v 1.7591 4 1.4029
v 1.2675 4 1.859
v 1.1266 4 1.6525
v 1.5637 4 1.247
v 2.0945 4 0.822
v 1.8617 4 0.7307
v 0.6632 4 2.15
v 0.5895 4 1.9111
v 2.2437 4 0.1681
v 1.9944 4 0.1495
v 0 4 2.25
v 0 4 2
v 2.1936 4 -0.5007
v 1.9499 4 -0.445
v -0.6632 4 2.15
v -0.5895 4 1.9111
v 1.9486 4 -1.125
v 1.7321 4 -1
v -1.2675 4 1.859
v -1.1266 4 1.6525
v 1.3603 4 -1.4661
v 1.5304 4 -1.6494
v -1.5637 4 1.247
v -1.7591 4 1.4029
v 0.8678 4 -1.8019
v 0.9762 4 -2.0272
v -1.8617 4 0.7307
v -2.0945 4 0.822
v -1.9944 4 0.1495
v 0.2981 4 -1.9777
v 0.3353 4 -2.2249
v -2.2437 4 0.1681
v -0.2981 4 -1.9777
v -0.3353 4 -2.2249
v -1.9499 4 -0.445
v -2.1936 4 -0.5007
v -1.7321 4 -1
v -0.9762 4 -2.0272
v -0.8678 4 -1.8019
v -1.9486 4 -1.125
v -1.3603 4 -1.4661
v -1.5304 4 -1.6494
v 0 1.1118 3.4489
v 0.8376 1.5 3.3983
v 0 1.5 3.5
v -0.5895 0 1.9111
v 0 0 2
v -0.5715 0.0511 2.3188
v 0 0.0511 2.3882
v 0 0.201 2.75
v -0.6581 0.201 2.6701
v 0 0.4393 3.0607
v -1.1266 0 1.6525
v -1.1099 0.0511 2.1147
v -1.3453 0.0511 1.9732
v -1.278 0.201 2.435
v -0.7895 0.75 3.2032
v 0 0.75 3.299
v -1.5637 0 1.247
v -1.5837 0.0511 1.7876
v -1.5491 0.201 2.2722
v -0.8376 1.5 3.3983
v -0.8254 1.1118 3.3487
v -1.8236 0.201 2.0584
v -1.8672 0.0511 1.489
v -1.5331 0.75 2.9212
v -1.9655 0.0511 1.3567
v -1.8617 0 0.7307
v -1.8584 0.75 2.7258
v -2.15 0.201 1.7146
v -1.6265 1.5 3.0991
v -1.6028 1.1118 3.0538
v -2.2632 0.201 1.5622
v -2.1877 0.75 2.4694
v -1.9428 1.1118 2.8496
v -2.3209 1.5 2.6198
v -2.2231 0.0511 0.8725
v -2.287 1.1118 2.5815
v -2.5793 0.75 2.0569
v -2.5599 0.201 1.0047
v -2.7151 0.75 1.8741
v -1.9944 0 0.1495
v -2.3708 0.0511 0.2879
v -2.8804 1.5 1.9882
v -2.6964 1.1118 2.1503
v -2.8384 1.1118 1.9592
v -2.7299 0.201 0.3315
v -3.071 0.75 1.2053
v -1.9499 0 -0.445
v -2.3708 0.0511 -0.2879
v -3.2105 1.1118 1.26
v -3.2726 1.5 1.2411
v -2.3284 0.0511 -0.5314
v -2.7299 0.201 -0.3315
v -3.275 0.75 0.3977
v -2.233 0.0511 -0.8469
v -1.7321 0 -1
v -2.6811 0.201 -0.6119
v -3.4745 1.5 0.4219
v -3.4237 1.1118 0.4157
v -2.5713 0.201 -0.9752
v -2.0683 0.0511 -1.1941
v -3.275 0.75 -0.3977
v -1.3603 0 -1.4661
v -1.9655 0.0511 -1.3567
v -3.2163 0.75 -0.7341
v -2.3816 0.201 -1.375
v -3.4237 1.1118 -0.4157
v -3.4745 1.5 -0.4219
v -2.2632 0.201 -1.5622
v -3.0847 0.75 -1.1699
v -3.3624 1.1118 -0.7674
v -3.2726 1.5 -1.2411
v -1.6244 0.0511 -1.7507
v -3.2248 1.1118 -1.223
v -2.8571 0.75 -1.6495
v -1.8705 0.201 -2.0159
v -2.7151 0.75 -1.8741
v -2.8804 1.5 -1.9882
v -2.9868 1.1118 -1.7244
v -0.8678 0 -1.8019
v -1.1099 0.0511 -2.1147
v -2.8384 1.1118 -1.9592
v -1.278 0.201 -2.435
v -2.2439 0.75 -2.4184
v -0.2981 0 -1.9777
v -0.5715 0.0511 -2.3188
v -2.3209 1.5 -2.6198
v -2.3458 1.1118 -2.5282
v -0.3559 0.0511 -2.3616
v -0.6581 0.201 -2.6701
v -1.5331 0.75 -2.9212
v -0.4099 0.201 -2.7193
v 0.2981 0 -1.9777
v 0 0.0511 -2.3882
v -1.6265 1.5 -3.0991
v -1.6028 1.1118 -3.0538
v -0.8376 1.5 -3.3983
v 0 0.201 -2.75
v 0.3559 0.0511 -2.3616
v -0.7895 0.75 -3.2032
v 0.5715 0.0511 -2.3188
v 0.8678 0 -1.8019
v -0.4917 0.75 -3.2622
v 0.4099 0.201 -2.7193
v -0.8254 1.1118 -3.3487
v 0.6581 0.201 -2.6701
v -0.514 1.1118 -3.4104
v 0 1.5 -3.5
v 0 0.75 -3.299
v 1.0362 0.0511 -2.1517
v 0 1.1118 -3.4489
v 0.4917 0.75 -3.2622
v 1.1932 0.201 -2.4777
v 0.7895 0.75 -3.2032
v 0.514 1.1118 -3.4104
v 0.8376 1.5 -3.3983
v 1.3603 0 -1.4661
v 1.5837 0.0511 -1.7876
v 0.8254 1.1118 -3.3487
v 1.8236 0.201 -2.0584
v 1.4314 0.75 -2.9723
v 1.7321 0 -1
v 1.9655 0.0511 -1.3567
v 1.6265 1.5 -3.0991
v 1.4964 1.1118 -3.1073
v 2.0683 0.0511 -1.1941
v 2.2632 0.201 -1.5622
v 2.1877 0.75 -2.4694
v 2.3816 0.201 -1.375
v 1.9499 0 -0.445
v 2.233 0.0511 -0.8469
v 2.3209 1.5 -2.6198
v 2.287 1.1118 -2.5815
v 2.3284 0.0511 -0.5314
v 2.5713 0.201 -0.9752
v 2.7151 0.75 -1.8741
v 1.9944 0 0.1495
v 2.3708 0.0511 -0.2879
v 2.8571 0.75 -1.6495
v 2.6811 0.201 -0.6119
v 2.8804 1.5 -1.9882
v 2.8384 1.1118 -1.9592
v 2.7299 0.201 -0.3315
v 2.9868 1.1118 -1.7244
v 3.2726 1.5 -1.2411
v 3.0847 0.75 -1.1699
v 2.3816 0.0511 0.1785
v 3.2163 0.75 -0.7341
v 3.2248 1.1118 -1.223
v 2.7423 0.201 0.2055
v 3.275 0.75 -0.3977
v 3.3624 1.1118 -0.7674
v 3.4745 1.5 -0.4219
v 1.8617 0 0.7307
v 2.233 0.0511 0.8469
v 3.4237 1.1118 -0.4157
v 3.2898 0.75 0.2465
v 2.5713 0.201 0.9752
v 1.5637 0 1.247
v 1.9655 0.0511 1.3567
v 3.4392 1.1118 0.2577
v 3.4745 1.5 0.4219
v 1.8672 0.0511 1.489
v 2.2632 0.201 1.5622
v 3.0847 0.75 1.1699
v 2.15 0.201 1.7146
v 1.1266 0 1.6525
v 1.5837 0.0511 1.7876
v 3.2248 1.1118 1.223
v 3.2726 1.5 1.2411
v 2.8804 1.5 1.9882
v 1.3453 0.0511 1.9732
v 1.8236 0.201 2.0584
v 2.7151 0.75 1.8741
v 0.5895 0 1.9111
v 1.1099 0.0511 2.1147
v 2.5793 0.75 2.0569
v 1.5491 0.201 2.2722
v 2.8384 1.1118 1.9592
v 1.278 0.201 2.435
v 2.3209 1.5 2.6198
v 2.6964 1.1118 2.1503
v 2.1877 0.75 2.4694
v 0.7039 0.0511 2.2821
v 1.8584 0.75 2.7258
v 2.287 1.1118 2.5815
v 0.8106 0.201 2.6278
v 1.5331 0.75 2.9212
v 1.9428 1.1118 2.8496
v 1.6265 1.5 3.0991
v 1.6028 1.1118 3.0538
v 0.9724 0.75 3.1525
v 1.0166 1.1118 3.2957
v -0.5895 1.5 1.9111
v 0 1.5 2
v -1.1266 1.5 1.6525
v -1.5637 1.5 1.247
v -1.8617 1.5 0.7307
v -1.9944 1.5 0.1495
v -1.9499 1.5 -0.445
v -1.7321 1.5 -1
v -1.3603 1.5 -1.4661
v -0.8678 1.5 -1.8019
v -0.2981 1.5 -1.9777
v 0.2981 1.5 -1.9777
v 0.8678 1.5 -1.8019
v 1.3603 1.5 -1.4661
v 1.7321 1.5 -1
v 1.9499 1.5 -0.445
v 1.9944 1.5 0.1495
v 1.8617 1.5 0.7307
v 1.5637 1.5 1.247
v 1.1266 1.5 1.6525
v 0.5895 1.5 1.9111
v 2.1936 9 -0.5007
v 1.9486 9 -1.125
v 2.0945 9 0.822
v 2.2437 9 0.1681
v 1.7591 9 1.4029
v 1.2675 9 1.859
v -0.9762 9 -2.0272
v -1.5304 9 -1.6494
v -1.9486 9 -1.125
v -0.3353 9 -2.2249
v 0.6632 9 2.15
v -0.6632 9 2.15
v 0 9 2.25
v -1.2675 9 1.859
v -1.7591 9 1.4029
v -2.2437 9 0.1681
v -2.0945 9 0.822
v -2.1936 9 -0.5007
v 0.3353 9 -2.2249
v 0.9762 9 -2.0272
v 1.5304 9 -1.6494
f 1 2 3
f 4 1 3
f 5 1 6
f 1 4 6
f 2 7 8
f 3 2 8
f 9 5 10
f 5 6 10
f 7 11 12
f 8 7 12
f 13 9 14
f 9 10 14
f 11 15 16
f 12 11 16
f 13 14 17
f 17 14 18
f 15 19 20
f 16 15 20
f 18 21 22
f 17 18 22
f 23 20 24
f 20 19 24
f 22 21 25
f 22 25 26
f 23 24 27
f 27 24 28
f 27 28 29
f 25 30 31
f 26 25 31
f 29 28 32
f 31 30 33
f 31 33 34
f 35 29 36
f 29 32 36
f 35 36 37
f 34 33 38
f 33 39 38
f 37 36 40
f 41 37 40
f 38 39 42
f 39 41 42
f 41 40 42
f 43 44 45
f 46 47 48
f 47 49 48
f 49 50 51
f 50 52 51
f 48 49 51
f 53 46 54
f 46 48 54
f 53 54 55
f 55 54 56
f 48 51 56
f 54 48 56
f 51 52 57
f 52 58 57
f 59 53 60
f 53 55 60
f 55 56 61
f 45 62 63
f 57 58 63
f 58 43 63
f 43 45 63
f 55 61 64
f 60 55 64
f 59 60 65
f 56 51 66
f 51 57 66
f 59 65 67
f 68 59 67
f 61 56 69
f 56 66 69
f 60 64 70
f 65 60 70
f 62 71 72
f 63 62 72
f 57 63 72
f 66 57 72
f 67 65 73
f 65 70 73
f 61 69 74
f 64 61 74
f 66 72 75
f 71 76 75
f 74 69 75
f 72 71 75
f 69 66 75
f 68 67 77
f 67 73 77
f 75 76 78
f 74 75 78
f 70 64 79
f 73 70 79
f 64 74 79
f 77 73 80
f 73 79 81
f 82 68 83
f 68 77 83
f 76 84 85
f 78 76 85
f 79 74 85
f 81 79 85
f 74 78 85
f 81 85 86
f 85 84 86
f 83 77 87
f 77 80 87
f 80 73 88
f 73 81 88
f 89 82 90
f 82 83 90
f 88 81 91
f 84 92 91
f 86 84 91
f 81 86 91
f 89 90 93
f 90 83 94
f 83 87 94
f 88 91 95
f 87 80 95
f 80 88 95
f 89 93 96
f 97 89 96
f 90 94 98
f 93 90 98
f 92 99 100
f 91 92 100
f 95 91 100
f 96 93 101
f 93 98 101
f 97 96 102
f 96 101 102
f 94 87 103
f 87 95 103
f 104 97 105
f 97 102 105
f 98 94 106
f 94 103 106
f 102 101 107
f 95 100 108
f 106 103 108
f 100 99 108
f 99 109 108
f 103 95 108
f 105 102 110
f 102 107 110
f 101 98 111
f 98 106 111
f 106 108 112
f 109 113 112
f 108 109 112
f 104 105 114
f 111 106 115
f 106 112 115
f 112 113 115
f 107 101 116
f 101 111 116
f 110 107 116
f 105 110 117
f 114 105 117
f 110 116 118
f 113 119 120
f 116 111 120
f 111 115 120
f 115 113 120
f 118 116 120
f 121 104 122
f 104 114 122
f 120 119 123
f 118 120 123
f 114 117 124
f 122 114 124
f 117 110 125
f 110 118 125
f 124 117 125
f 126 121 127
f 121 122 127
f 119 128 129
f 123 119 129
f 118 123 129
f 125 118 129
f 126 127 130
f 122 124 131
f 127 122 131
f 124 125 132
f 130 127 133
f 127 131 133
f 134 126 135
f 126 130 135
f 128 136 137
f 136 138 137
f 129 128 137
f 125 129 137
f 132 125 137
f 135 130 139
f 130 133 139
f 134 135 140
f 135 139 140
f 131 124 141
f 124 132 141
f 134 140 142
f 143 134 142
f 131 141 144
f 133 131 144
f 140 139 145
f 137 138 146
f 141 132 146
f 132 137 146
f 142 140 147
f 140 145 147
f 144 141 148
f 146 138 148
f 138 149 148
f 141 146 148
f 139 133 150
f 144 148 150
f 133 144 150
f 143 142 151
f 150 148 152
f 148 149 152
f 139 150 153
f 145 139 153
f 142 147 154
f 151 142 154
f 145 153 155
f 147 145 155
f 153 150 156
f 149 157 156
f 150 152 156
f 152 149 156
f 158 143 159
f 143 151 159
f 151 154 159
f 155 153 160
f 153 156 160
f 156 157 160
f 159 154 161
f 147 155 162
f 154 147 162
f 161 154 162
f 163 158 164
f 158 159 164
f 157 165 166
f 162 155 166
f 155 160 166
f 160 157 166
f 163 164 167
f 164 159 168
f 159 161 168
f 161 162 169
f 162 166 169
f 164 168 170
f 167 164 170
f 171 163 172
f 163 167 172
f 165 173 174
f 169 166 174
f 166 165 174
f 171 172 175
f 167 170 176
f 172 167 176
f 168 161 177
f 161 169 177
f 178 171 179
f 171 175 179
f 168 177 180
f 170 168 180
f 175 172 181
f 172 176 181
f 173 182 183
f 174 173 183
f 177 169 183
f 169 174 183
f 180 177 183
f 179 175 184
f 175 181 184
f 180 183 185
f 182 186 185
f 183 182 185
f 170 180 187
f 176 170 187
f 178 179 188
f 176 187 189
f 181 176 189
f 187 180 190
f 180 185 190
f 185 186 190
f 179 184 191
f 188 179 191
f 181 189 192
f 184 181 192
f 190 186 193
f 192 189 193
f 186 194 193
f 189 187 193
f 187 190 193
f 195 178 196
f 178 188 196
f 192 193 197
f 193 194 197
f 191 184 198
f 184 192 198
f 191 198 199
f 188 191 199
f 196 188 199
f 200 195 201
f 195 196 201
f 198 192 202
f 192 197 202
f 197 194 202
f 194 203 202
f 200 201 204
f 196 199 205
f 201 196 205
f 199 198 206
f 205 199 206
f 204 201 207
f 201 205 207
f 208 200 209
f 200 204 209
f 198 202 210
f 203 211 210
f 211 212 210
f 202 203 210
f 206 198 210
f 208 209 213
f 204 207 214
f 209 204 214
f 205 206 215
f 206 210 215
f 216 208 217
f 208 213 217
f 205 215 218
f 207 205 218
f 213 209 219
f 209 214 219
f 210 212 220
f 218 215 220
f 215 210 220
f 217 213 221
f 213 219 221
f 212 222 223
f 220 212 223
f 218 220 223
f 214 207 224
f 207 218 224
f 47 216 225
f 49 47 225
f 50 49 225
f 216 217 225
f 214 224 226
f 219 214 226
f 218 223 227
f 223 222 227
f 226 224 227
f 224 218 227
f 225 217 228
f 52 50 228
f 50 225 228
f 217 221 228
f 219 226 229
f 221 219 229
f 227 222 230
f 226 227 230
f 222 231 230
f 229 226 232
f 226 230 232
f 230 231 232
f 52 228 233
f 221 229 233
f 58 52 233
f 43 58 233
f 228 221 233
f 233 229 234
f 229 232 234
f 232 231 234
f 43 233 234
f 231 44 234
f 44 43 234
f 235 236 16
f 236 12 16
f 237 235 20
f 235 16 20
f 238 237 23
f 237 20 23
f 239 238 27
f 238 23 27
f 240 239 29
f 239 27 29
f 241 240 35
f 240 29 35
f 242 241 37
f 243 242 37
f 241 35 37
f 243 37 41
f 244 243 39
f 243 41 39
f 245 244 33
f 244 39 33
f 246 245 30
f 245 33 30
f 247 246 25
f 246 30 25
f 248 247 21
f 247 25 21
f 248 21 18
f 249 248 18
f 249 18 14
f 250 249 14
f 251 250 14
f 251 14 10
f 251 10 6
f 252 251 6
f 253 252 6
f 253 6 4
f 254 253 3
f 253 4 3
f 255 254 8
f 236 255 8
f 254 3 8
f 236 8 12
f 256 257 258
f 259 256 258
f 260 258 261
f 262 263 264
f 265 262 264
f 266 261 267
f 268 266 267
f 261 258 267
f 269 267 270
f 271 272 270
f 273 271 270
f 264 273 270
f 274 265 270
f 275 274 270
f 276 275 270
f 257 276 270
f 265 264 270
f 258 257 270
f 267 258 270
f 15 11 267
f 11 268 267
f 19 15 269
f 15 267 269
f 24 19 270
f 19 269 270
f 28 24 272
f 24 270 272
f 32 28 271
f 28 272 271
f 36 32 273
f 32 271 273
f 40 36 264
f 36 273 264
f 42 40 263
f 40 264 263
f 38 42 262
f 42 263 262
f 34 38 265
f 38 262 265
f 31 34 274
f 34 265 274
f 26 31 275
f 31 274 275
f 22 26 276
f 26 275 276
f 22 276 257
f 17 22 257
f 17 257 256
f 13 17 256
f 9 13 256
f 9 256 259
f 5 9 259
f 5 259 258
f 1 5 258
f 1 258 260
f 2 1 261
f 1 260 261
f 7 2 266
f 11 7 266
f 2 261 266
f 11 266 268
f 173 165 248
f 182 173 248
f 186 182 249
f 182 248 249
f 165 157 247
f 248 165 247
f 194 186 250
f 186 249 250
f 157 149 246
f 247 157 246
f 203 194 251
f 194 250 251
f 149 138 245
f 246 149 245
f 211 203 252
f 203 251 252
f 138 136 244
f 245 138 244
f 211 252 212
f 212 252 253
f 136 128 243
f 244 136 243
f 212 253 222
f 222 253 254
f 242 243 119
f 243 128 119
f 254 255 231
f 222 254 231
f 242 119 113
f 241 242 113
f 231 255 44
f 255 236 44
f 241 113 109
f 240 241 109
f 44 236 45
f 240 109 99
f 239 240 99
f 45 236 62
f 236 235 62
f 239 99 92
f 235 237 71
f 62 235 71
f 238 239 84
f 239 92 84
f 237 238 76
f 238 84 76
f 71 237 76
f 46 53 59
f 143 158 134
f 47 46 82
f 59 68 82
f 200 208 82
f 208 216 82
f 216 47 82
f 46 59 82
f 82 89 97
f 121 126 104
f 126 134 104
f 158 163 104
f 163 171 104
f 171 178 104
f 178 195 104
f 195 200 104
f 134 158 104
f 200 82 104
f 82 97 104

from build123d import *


with BuildPart() as part:
    # Esboço1 → Revolução1 (revolve)
    with BuildSketch(Plane(origin=(0, 0, 0), x_dir=(0, 0, -1), z_dir=(1, 0, 0))):
        with BuildLine():
            Line((0, 0), (-2, 0))
            ThreePointArc((-2, 0), (-3.060660172, 0.439339828), (-3.5, 1.5))
            Line((-3.5, 1.5), (-2, 1.5))
            Line((-2, 1.5), (-2, 4))
            Line((-2, 4), (-2.25, 4))
            Line((-2.25, 4), (-2.25, 9))
            Line((-2.25, 9), (0, 9))
            Line((0, 9), (0, 0))
        make_face()
    revolve(axis=Axis((0, 0, 0), (0, -1, 0)))


solid = part.part
